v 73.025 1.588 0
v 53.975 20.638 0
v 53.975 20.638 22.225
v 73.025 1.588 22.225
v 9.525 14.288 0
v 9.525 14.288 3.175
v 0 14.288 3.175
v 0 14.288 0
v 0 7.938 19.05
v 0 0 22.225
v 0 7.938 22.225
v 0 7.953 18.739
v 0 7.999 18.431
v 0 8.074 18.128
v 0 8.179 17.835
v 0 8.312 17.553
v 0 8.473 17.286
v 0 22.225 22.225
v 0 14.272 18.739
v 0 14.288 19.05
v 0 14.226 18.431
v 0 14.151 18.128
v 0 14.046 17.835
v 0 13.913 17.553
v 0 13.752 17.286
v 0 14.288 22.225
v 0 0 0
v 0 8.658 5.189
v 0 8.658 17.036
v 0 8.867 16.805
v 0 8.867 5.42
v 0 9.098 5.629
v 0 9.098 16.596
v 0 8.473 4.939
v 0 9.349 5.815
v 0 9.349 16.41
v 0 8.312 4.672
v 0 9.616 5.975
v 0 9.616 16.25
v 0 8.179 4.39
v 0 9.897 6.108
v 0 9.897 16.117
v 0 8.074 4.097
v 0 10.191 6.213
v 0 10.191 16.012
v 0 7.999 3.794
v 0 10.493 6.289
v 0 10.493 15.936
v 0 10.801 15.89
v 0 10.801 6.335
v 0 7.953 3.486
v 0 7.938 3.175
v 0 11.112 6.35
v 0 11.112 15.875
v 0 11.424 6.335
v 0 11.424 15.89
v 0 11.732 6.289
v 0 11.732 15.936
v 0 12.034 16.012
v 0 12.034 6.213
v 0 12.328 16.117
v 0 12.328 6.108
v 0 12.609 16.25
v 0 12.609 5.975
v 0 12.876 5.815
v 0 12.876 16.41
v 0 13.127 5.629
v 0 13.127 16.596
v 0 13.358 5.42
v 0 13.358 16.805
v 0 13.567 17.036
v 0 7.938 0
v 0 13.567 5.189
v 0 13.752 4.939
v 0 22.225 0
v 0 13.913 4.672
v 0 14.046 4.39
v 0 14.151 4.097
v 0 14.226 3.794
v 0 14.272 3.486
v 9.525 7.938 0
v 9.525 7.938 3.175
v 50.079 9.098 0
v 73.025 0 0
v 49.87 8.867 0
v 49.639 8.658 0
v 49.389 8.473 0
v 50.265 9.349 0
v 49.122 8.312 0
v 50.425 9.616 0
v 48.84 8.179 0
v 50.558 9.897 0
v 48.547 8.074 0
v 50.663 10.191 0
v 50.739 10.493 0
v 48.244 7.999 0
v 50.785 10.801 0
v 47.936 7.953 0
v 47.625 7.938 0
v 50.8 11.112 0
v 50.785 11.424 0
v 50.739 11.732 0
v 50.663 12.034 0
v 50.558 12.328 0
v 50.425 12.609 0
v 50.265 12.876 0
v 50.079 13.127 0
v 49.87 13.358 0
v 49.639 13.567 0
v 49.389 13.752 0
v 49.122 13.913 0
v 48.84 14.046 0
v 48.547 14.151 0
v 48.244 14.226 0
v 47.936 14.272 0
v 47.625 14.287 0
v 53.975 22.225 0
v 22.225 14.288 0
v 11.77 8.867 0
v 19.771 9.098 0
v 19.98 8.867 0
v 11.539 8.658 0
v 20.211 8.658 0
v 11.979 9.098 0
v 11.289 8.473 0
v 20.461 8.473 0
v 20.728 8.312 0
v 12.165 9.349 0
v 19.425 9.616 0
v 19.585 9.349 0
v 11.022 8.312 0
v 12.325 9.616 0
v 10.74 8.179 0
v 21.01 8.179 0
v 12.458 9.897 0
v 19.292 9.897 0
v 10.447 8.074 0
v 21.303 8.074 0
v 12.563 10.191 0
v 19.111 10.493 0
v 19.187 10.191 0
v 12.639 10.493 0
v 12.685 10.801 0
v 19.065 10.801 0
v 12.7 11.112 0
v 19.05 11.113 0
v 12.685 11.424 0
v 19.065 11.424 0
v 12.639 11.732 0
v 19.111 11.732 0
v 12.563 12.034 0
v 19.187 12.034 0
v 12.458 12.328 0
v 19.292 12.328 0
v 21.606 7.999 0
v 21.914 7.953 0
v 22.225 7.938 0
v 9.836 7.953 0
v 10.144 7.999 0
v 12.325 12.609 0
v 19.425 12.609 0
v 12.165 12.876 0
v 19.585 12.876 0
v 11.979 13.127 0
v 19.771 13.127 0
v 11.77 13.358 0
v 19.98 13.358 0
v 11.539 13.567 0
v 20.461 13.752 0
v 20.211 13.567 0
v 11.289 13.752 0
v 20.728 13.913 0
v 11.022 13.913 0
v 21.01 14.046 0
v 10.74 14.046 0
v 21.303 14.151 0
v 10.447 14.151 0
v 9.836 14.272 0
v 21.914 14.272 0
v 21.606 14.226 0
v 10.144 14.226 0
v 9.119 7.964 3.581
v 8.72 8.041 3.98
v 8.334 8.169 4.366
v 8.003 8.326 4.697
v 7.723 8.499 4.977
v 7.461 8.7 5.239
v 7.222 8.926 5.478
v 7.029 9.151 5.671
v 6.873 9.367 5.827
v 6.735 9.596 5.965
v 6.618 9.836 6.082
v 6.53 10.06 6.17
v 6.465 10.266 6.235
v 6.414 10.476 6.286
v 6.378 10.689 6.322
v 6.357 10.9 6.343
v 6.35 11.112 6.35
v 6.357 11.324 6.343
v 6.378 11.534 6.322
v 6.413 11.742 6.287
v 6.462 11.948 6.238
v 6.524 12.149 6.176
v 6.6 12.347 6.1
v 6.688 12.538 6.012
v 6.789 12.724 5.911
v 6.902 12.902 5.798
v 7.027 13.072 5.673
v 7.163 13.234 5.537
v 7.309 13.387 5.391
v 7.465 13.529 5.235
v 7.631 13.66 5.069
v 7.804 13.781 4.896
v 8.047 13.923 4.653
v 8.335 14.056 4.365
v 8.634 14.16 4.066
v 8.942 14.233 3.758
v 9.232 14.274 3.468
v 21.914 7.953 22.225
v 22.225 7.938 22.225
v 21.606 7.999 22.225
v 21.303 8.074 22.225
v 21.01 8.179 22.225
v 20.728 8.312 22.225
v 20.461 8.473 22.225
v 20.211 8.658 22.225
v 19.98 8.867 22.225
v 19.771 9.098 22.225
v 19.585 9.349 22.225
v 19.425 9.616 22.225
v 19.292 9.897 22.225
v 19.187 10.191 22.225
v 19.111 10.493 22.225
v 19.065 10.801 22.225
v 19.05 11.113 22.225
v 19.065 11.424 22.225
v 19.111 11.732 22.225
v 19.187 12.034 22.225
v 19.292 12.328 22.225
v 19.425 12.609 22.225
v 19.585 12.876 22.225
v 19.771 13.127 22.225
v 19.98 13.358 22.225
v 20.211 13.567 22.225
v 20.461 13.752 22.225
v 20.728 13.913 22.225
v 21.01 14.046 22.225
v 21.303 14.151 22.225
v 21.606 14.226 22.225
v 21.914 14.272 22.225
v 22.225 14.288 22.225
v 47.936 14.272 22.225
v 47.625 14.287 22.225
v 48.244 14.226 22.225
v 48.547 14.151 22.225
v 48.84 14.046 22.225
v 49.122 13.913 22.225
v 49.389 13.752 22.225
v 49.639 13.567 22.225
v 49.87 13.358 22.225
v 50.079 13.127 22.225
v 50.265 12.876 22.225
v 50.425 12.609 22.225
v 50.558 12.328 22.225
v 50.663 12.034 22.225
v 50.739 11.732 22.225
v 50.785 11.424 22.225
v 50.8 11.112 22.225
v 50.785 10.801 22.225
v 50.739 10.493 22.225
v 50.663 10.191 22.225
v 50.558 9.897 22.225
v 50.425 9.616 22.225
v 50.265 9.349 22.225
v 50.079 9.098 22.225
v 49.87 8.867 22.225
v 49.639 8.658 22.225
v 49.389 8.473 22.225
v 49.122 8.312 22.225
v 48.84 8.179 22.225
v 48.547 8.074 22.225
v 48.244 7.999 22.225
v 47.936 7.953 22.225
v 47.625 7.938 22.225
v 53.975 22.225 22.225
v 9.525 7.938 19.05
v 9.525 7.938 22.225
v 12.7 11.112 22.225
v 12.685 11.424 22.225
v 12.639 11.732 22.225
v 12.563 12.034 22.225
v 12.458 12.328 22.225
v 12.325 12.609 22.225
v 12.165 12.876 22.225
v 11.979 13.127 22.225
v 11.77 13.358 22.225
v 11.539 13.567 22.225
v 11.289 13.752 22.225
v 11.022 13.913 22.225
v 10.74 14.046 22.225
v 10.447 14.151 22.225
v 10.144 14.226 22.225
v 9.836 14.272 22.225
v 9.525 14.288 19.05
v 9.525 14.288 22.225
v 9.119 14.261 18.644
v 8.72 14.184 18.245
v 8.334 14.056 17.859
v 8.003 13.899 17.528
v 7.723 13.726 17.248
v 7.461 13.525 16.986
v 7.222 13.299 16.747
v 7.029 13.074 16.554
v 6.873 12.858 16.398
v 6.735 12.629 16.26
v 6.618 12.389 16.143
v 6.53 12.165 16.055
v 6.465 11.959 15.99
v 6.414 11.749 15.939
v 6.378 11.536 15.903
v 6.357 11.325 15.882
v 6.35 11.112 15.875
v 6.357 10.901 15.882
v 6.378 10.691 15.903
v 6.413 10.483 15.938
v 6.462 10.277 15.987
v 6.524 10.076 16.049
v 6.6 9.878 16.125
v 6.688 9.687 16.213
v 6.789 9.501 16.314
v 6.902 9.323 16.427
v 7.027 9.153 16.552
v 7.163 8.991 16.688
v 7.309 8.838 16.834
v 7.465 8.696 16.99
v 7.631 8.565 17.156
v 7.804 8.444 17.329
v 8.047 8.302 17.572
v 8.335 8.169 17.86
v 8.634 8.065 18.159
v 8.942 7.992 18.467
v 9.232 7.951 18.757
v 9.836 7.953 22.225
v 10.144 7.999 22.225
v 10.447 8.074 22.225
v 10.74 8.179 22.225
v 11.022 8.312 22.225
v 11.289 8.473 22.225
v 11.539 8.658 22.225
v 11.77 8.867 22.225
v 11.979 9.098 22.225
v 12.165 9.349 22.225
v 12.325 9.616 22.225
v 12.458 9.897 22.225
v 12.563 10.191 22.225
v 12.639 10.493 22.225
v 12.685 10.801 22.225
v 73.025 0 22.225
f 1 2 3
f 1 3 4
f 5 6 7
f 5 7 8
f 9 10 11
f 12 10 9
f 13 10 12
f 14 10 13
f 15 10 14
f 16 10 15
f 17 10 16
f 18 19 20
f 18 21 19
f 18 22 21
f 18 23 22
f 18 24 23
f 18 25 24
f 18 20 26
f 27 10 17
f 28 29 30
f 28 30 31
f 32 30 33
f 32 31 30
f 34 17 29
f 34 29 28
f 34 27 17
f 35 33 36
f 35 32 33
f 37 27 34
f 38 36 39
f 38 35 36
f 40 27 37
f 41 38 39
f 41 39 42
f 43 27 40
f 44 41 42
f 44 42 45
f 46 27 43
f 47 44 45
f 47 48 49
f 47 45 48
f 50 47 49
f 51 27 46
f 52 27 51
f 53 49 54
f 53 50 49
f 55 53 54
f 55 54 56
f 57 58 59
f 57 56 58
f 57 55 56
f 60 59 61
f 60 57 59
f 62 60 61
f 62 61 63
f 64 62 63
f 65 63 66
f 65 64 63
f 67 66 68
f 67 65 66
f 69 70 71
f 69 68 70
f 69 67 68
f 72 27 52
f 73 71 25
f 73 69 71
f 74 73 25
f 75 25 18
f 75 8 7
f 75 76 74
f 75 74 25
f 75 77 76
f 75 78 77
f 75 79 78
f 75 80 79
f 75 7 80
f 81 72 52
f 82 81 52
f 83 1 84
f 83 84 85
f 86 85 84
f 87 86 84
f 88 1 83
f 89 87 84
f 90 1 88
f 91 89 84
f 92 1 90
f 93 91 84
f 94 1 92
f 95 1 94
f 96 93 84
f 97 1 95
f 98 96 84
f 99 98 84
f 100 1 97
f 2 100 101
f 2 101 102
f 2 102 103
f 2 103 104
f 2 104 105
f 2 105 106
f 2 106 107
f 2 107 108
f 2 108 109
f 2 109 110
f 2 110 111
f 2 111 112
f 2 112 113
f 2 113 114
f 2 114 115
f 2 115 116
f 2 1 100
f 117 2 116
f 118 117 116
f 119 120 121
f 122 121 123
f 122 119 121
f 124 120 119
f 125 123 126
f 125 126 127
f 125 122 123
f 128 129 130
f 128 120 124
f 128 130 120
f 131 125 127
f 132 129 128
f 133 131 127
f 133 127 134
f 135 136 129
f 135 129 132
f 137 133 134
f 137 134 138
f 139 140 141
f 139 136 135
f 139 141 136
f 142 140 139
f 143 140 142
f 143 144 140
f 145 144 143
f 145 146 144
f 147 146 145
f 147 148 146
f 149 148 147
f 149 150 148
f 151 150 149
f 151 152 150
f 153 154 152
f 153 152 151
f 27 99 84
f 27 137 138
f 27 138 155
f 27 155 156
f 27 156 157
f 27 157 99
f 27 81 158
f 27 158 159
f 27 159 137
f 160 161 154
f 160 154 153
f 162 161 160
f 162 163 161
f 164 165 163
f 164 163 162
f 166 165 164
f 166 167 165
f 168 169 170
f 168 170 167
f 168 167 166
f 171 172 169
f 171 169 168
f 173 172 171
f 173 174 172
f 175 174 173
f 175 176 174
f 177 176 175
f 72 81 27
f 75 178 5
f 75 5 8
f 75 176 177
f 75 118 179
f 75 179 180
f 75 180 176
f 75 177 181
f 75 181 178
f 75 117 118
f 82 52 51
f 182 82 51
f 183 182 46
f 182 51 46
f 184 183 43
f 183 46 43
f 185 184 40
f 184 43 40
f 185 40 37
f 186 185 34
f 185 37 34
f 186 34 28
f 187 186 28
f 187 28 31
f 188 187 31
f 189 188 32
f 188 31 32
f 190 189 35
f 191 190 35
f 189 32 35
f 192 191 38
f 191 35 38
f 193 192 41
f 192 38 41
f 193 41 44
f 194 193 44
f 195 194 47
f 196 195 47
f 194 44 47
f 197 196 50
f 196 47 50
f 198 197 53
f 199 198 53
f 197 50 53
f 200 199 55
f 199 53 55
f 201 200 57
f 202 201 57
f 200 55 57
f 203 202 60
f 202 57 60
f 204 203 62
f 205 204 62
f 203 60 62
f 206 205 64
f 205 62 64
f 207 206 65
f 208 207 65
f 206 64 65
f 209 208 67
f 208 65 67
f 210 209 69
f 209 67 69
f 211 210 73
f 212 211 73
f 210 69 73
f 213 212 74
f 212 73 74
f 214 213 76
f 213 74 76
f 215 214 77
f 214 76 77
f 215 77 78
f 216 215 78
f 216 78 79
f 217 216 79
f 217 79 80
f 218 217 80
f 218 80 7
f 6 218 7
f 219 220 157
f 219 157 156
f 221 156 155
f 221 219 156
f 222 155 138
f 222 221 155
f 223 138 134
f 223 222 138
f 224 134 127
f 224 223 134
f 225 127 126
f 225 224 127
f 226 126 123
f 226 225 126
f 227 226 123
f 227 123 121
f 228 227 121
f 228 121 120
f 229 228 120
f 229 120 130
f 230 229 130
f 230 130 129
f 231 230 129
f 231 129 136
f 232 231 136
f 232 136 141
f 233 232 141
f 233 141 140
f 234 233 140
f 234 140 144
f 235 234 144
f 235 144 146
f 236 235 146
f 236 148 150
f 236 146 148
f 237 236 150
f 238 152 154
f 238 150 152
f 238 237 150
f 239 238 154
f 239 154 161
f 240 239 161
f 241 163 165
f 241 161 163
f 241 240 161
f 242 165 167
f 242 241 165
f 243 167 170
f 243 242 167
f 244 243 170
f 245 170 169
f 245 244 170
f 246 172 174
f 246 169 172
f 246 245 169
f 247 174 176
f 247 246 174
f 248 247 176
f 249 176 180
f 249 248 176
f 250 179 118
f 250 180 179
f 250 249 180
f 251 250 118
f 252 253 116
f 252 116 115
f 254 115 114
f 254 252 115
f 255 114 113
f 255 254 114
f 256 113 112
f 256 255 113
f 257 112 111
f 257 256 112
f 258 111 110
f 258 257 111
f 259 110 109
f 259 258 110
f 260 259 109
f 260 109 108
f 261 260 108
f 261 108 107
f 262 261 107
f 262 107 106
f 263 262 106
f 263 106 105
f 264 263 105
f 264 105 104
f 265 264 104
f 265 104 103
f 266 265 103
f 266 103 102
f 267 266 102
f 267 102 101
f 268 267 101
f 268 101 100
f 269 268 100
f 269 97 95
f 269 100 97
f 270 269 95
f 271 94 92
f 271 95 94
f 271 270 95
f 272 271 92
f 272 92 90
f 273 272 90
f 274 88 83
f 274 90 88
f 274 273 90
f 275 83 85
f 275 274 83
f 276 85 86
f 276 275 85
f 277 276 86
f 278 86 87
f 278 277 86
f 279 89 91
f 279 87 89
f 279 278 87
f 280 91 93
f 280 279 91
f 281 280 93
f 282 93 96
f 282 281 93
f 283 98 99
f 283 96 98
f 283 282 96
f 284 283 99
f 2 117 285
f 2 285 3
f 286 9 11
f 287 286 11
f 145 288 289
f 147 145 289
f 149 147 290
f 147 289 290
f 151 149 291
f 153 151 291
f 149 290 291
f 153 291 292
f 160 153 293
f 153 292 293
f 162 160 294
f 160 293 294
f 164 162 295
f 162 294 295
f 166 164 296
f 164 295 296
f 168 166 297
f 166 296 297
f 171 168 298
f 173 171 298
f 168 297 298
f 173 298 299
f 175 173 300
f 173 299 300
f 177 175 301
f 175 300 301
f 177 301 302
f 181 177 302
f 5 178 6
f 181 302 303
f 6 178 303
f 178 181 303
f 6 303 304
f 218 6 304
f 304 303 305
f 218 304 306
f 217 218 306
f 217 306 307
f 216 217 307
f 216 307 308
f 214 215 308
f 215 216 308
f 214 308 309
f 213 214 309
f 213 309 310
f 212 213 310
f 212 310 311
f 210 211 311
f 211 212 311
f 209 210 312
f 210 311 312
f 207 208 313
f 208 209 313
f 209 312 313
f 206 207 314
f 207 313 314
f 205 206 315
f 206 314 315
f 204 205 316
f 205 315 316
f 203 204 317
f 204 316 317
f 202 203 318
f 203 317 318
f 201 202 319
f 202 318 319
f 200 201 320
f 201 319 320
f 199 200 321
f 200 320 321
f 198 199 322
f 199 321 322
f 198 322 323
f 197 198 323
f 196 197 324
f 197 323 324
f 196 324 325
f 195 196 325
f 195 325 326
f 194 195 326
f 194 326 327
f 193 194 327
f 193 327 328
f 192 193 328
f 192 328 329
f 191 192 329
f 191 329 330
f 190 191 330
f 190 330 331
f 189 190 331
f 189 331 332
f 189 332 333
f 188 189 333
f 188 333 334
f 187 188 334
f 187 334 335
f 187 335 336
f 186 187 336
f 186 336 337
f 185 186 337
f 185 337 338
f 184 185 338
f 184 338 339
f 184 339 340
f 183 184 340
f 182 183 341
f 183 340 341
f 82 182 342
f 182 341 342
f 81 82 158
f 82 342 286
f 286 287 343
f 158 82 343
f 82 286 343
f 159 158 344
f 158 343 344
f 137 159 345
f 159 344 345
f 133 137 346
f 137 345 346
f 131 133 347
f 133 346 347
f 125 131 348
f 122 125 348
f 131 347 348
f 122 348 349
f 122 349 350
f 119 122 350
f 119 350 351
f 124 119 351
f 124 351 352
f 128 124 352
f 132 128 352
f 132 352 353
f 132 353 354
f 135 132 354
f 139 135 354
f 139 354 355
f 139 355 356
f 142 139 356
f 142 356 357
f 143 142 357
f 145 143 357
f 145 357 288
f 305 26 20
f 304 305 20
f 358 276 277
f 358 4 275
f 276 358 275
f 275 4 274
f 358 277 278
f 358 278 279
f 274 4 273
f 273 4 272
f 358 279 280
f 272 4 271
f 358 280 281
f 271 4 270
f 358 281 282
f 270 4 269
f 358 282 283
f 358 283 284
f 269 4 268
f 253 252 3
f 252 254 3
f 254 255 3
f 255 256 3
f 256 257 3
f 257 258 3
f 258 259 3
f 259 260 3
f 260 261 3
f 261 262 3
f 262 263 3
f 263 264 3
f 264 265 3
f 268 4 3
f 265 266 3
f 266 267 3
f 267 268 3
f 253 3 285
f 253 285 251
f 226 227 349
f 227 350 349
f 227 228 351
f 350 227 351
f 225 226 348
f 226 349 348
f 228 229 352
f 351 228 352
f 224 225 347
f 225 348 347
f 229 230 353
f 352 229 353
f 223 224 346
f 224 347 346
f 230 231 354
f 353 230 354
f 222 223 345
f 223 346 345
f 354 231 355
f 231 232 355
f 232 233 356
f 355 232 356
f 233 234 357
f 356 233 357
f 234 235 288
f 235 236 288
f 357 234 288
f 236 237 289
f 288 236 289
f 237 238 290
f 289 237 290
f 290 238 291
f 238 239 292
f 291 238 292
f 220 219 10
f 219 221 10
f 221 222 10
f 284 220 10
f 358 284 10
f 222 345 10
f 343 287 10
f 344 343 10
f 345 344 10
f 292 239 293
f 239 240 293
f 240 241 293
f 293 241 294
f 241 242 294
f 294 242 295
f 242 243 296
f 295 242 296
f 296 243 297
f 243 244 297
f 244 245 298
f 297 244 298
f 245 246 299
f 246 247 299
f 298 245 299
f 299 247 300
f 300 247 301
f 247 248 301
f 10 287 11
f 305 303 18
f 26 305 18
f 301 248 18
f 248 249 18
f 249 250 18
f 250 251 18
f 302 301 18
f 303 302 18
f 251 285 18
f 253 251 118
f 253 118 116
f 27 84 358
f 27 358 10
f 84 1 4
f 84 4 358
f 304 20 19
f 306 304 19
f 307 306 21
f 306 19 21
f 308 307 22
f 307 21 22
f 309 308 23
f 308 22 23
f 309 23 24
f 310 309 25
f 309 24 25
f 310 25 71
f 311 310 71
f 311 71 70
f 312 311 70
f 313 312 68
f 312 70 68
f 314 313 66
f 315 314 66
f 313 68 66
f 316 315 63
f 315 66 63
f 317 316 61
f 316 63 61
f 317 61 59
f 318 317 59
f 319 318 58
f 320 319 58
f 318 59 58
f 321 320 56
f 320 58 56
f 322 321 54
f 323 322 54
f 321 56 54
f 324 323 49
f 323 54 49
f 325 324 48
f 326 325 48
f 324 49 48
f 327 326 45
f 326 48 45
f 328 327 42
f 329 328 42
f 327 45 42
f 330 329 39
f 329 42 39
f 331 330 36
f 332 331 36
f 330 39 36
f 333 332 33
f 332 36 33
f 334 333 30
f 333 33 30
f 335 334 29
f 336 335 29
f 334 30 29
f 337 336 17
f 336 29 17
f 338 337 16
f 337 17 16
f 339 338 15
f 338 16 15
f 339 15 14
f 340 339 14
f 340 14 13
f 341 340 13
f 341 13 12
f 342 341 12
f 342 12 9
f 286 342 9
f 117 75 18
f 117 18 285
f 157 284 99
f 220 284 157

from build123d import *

# Parameters (mm, degrees)
BOSS_EXTRUDE1_DEPTH = 22.225
SKETCH8_R           = 3.175
CUT_EXTRUDE7_DEPTH  = 29.21
CUT_EXTRUDE8_REACH  = 75.025


with BuildPart() as part:
    # Sketch1 → Boss-Extrude1 (new body)
    with BuildSketch(Plane.XY):
        Polygon((0, 0), (0, 22.225), (53.975, 22.225), (53.975, 20.6375), (73.025, 1.5875), (73.025, 0), align=None)
    extrude(amount=BOSS_EXTRUDE1_DEPTH)

    # Sketch8 → Cut-Extrude7 (cut)
    with BuildSketch(Plane.XY.offset(22.225)):
        with Locations((9.525, 11.1125)):
            Circle(SKETCH8_R)
        with BuildLine():
            Line((22.225, 14.2875), (47.625, 14.2875))
            ThreePointArc((47.625, 14.2875), (50.8, 11.1125), (47.625, 7.9375))
            Line((47.625, 7.9375), (22.225, 7.9375))
            ThreePointArc((22.225, 7.9375), (19.05, 11.1125), (22.225, 14.2875))
        make_face()
    extrude(amount=-CUT_EXTRUDE7_DEPTH, mode=Mode.SUBTRACT)

    # Sketch10 → Cut-Extrude8 (cut, up to next)
    with BuildSketch(Plane.ZY, mode=Mode.PRIVATE) as cut_extrude8_sk1:
        with BuildLine():
            Line((3.175, 14.2875), (0, 14.2875))
            Line((0, 14.2875), (0, 7.9375))
            Line((0, 7.9375), (3.175, 7.9375))
            ThreePointArc((3.175, 7.9375), (6.35, 11.1125), (3.175, 14.2875))
        make_face()
    cut_extrude8_tool1 = extrude(cut_extrude8_sk1.sketch, amount=-CUT_EXTRUDE8_REACH, mode=Mode.PRIVATE) & part.part
    add(cut_extrude8_tool1.solids().sort_by_distance((0, 11.1125, 2.878614))[0], mode=Mode.SUBTRACT)
    # Sketch10 → Cut-Extrude8 (cut, up to next)
    with BuildSketch(Plane.ZY, mode=Mode.PRIVATE) as cut_extrude8_sk2:
        with BuildLine():
            Line((19.05, 7.9375), (22.225, 7.9375))
            Line((22.225, 7.9375), (22.225, 14.2875))
            Line((22.225, 14.2875), (19.05, 14.2875))
            ThreePointArc((19.05, 14.2875), (15.875, 11.1125), (19.05, 7.9375))
        make_face()
    cut_extrude8_tool2 = extrude(cut_extrude8_sk2.sketch, amount=-CUT_EXTRUDE8_REACH, mode=Mode.PRIVATE) & part.part
    add(cut_extrude8_tool2.solids().sort_by_distance((0, 11.1125, 19.346386))[0], mode=Mode.SUBTRACT)


solid = part.part
